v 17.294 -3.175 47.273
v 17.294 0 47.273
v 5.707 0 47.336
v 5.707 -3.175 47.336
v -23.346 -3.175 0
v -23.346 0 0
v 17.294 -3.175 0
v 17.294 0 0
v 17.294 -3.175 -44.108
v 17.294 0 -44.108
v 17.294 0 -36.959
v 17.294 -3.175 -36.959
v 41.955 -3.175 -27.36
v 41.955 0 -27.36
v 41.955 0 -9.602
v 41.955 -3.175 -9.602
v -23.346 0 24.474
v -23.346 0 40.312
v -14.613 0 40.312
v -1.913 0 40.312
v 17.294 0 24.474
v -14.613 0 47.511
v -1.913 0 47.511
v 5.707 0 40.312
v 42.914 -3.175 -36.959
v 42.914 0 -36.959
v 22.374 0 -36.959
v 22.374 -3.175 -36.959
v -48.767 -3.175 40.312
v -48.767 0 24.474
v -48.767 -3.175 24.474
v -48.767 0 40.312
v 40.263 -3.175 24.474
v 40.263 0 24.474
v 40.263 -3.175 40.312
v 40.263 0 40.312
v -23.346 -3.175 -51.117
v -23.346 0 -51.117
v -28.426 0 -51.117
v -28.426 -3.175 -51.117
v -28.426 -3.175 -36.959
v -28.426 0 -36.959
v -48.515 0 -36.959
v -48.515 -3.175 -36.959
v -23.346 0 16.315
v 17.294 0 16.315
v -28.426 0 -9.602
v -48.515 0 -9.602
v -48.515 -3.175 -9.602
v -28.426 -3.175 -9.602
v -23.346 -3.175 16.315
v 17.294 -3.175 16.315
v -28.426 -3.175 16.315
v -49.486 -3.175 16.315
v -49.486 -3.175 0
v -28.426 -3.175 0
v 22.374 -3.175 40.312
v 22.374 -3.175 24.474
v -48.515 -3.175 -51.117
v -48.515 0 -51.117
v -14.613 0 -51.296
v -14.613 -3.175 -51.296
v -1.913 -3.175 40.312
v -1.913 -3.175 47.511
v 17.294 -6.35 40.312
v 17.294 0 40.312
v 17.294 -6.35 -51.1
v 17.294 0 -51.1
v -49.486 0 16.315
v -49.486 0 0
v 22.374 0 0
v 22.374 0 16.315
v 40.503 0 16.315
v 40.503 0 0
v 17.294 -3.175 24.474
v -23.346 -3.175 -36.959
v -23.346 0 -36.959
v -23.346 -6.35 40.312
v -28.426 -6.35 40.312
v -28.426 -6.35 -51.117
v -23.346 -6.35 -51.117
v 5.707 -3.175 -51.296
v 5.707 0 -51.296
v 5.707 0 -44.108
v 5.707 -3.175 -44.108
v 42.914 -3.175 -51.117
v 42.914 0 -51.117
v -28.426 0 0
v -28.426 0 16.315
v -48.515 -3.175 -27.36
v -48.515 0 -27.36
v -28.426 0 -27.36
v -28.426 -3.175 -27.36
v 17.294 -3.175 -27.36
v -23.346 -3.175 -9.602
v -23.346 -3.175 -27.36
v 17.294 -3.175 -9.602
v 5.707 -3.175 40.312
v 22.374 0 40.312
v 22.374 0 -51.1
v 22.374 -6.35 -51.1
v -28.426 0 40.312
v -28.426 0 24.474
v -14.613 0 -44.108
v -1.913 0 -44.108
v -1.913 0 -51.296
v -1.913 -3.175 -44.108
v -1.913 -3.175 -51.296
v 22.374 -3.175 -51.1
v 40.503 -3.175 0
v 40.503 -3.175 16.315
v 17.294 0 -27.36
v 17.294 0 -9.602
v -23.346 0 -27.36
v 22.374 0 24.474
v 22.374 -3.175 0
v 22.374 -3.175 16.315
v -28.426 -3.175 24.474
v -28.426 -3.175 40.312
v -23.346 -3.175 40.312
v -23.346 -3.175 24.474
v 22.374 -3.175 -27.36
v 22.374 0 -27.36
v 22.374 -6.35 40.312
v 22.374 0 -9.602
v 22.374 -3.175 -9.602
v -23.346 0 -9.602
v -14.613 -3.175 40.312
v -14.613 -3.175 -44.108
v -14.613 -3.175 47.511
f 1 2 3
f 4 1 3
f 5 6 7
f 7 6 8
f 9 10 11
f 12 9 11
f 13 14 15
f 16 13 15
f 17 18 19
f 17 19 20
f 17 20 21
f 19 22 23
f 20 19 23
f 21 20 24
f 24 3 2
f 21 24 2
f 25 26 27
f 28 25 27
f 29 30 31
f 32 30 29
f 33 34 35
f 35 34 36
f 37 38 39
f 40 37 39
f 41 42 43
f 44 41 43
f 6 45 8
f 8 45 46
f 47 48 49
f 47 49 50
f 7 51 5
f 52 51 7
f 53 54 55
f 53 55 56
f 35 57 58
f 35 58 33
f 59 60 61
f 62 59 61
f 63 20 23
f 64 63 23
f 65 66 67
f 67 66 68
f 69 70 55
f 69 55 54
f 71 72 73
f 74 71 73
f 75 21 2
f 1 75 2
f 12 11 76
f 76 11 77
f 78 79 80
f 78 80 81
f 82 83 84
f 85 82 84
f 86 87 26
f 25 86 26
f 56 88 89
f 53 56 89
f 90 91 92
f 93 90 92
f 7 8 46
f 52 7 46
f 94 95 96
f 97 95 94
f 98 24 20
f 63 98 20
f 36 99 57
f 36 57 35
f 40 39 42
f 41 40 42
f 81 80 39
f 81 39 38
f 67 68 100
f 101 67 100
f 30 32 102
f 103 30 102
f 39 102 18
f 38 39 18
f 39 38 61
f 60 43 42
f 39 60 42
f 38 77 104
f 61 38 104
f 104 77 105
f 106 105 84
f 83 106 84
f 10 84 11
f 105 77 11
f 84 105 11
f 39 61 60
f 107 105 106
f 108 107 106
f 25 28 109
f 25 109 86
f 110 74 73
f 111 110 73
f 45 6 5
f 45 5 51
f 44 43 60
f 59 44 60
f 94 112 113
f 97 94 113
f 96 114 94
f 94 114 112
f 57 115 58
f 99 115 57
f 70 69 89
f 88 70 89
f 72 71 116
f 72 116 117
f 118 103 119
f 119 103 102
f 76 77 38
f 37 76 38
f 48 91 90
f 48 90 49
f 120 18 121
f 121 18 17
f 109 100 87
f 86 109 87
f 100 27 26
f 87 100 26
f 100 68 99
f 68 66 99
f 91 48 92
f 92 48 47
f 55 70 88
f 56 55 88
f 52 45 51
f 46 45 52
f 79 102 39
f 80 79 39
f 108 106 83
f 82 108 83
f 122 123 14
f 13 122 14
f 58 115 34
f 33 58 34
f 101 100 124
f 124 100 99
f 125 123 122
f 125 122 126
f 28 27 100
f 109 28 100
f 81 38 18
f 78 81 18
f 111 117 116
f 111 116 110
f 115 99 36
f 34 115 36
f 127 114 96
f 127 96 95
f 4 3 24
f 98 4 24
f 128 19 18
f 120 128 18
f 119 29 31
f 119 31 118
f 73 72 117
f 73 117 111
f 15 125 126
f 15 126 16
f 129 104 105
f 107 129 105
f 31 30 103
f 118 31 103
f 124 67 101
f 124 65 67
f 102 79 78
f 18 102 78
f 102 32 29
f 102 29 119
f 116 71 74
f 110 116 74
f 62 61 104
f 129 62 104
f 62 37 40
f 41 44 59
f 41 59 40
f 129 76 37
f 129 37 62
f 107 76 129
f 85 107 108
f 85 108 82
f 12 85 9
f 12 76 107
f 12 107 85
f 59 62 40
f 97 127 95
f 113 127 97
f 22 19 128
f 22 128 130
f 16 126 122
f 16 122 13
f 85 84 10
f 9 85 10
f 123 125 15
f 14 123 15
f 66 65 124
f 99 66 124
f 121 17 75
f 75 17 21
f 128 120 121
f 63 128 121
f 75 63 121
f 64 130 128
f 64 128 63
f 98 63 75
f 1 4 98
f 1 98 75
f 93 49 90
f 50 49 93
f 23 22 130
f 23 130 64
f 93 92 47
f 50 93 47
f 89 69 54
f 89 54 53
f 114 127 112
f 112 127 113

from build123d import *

# Parameters (mm, degrees)
F0_W     = 12.7
F0_H     = 7.1991272271
F1_DEPTH = 3.175
F0_W_2   = 40.64
F0_H_2   = 16.3149703294
F0_H_3   = 17.7578479052
F0_W_3   = 20.0888210887
F0_W_4   = 21.0607587677
F0_W_5   = 20.3408464175
F0_H_4   = 15.8380791545
F0_W_6   = 17.8883576828
F0_W_7   = 18.128329708
F0_W_8   = 19.5802114373
F0_W_9   = 5.08
F0_H_5   = 8.1590097398
F0_H_6   = 9.6018854529
F0_H_7   = 9.5988344401
F0_H_8   = 14.158282429
F2_DEPTH = 6.35


# Not quite as in the source:
# - a feature names something its author has since deleted; it is built from what else it names


with BuildPart() as f1:
    # F0 (on Front) → F1 (new body)
    with BuildSketch(Plane.XZ):
        Polygon((-14.6131411788, 40.3120592237), (-23.3456920832, 40.3120592237), (-23.3456920832, 24.4739800692), (17.2943079168, 24.4739800692), (17.2943079168, 40.3120592237), (5.7068588212, 40.3120592237), (-1.9131411788, 40.3120592237), align=None)
        with Locations((-8.2631411788, 43.9116228372)):
            Rectangle(F0_W, F0_H)
        Polygon((5.7068588212, 40.3120592237), (17.2943079168, 40.3120592237), (17.2943079168, 47.2727881546), (5.7068588212, 47.3364423823), align=None)
    extrude(amount=F1_DEPTH)


with BuildPart() as f1b:
    # F0 (on Front) → F1, piece 2 (new body)
    with BuildSketch(Plane.XZ):
        with Locations((-3.0256920832, 8.1574851647)):
            Rectangle(F0_W_2, F0_H_2)
    extrude(amount=F1_DEPTH)


with BuildPart() as f1c:
    # F0 (on Front) → F1, piece 3 (new body)
    with BuildSketch(Plane.XZ):
        with Locations((-3.0256920832, -18.4808094054)):
            Rectangle(F0_W_2, F0_H_3)
    extrude(amount=F1_DEPTH)


with BuildPart() as f1d:
    # F0 (on Front) → F1, piece 4 (new body)
    with BuildSketch(Plane.XZ):
        Polygon((-28.4256920832, -51.1168502271), (-28.4256920832, -36.9585677981), (-48.5145131719, -36.9585677981), (-48.5145131719, -51.1168502271), (-14.6131411788, -51.296133548), (-14.6131411788, -44.107933548), (-1.9131411788, -44.107933548), (-1.9131411788, -51.296133548), (5.7068588212, -51.296133548), (5.7068588212, -44.107933548), (17.2943079168, -44.107933548), (17.2943079168, -36.9585677981), (-23.3456920832, -36.9585677981), (-23.3456920832, -51.1168502271), align=None)
    extrude(amount=F1_DEPTH)


with BuildPart() as f1e:
    # F0 (on Front) → F1, piece 5 (new body)
    with BuildSketch(Plane.XZ):
        with Locations((-38.4701026276, -18.4808094054)):
            Rectangle(F0_W_3, F0_H_3)
    extrude(amount=F1_DEPTH)


with BuildPart() as f1f:
    # F0 (on Front) → F1, piece 6 (new body)
    with BuildSketch(Plane.XZ):
        with Locations((-38.9560714671, 8.1574851647)):
            Rectangle(F0_W_4, F0_H_2)
    extrude(amount=F1_DEPTH)


with BuildPart() as f1g:
    # F0 (on Front) → F1, piece 7 (new body)
    with BuildSketch(Plane.XZ):
        with Locations((-38.596115292, 32.3930196464)):
            Rectangle(F0_W_5, F0_H_4)
    extrude(amount=F1_DEPTH)


with BuildPart() as f1h:
    # F0 (on Front) → F1, piece 8 (new body)
    with BuildSketch(Plane.XZ):
        with Locations((31.3184867582, 32.3930196464)):
            Rectangle(F0_W_6, F0_H_4)
    extrude(amount=F1_DEPTH)


with BuildPart() as f1i:
    # F0 (on Front) → F1, piece 9 (new body)
    with BuildSketch(Plane.XZ):
        with Locations((31.4384727708, 8.1574851647)):
            Rectangle(F0_W_7, F0_H_2)
    extrude(amount=F1_DEPTH)


with BuildPart() as f1j:
    # F0 (on Front) → F1, piece 10 (new body)
    with BuildSketch(Plane.XZ):
        with Locations((32.1644136354, -18.4808094054)):
            Rectangle(F0_W_8, F0_H_3)
    extrude(amount=F1_DEPTH)


with BuildPart() as f1k:
    # F0 (on Front) → F1, piece 11 (new body)
    with BuildSketch(Plane.XZ):
        Polygon((42.9144074547, -36.9585677981), (22.3743079168, -36.9585677981), (22.3743079168, -51.1001323521), (42.9144074547, -51.1168502271), align=None)
    extrude(amount=F1_DEPTH)


with BuildPart() as f2:
    # F0 (on Front) → F2 (new body)
    with BuildSketch(Plane.XZ):
        with Locations((-25.8856920832, 20.3944751993)):
            Rectangle(F0_W_9, F0_H_5)
        with Locations((-25.8856920832, 32.3930196464)):
            Rectangle(F0_W_9, F0_H_4)
        with Locations((-25.8856920832, 8.1574851647)):
            Rectangle(F0_W_9, F0_H_2)
        with Locations((-25.8856920832, -4.8009427264)):
            Rectangle(F0_W_9, F0_H_6)
        with Locations((-25.8856920832, -18.4808094054)):
            Rectangle(F0_W_9, F0_H_3)
        with Locations((-25.8856920832, -32.1591505781)):
            Rectangle(F0_W_9, F0_H_7)
        with Locations((-25.8856920832, -44.0377090126)):
            Rectangle(F0_W_9, F0_H_8)
    extrude(amount=F2_DEPTH)


with BuildPart() as f2b:
    # F0 (on Front) → F2, piece 2 (new body)
    with BuildSketch(Plane.XZ):
        Polygon((22.3743079168, -36.9585677981), (17.2943079168, -36.9585677981), (17.2943079168, -44.107933548), (17.2943079168, -51.1001323521), (22.3743079168, -51.1001323521), align=None)
        with Locations((19.8343079168, -32.1591505781)):
            Rectangle(F0_W_9, F0_H_7)
        with Locations((19.8343079168, -18.4808094054)):
            Rectangle(F0_W_9, F0_H_3)
        with Locations((19.8343079168, -4.8009427264)):
            Rectangle(F0_W_9, F0_H_6)
        with Locations((19.8343079168, 8.1574851647)):
            Rectangle(F0_W_9, F0_H_2)
        with Locations((19.8343079168, 20.3944751993)):
            Rectangle(F0_W_9, F0_H_5)
        with Locations((19.8343079168, 32.3930196464)):
            Rectangle(F0_W_9, F0_H_4)
    extrude(amount=F2_DEPTH)


solid = Compound([f1.part, f1b.part, f1c.part, f1d.part, f1e.part, f1f.part, f1g.part, f1h.part, f1i.part, f1j.part, f1k.part, f2.part, f2b.part])
